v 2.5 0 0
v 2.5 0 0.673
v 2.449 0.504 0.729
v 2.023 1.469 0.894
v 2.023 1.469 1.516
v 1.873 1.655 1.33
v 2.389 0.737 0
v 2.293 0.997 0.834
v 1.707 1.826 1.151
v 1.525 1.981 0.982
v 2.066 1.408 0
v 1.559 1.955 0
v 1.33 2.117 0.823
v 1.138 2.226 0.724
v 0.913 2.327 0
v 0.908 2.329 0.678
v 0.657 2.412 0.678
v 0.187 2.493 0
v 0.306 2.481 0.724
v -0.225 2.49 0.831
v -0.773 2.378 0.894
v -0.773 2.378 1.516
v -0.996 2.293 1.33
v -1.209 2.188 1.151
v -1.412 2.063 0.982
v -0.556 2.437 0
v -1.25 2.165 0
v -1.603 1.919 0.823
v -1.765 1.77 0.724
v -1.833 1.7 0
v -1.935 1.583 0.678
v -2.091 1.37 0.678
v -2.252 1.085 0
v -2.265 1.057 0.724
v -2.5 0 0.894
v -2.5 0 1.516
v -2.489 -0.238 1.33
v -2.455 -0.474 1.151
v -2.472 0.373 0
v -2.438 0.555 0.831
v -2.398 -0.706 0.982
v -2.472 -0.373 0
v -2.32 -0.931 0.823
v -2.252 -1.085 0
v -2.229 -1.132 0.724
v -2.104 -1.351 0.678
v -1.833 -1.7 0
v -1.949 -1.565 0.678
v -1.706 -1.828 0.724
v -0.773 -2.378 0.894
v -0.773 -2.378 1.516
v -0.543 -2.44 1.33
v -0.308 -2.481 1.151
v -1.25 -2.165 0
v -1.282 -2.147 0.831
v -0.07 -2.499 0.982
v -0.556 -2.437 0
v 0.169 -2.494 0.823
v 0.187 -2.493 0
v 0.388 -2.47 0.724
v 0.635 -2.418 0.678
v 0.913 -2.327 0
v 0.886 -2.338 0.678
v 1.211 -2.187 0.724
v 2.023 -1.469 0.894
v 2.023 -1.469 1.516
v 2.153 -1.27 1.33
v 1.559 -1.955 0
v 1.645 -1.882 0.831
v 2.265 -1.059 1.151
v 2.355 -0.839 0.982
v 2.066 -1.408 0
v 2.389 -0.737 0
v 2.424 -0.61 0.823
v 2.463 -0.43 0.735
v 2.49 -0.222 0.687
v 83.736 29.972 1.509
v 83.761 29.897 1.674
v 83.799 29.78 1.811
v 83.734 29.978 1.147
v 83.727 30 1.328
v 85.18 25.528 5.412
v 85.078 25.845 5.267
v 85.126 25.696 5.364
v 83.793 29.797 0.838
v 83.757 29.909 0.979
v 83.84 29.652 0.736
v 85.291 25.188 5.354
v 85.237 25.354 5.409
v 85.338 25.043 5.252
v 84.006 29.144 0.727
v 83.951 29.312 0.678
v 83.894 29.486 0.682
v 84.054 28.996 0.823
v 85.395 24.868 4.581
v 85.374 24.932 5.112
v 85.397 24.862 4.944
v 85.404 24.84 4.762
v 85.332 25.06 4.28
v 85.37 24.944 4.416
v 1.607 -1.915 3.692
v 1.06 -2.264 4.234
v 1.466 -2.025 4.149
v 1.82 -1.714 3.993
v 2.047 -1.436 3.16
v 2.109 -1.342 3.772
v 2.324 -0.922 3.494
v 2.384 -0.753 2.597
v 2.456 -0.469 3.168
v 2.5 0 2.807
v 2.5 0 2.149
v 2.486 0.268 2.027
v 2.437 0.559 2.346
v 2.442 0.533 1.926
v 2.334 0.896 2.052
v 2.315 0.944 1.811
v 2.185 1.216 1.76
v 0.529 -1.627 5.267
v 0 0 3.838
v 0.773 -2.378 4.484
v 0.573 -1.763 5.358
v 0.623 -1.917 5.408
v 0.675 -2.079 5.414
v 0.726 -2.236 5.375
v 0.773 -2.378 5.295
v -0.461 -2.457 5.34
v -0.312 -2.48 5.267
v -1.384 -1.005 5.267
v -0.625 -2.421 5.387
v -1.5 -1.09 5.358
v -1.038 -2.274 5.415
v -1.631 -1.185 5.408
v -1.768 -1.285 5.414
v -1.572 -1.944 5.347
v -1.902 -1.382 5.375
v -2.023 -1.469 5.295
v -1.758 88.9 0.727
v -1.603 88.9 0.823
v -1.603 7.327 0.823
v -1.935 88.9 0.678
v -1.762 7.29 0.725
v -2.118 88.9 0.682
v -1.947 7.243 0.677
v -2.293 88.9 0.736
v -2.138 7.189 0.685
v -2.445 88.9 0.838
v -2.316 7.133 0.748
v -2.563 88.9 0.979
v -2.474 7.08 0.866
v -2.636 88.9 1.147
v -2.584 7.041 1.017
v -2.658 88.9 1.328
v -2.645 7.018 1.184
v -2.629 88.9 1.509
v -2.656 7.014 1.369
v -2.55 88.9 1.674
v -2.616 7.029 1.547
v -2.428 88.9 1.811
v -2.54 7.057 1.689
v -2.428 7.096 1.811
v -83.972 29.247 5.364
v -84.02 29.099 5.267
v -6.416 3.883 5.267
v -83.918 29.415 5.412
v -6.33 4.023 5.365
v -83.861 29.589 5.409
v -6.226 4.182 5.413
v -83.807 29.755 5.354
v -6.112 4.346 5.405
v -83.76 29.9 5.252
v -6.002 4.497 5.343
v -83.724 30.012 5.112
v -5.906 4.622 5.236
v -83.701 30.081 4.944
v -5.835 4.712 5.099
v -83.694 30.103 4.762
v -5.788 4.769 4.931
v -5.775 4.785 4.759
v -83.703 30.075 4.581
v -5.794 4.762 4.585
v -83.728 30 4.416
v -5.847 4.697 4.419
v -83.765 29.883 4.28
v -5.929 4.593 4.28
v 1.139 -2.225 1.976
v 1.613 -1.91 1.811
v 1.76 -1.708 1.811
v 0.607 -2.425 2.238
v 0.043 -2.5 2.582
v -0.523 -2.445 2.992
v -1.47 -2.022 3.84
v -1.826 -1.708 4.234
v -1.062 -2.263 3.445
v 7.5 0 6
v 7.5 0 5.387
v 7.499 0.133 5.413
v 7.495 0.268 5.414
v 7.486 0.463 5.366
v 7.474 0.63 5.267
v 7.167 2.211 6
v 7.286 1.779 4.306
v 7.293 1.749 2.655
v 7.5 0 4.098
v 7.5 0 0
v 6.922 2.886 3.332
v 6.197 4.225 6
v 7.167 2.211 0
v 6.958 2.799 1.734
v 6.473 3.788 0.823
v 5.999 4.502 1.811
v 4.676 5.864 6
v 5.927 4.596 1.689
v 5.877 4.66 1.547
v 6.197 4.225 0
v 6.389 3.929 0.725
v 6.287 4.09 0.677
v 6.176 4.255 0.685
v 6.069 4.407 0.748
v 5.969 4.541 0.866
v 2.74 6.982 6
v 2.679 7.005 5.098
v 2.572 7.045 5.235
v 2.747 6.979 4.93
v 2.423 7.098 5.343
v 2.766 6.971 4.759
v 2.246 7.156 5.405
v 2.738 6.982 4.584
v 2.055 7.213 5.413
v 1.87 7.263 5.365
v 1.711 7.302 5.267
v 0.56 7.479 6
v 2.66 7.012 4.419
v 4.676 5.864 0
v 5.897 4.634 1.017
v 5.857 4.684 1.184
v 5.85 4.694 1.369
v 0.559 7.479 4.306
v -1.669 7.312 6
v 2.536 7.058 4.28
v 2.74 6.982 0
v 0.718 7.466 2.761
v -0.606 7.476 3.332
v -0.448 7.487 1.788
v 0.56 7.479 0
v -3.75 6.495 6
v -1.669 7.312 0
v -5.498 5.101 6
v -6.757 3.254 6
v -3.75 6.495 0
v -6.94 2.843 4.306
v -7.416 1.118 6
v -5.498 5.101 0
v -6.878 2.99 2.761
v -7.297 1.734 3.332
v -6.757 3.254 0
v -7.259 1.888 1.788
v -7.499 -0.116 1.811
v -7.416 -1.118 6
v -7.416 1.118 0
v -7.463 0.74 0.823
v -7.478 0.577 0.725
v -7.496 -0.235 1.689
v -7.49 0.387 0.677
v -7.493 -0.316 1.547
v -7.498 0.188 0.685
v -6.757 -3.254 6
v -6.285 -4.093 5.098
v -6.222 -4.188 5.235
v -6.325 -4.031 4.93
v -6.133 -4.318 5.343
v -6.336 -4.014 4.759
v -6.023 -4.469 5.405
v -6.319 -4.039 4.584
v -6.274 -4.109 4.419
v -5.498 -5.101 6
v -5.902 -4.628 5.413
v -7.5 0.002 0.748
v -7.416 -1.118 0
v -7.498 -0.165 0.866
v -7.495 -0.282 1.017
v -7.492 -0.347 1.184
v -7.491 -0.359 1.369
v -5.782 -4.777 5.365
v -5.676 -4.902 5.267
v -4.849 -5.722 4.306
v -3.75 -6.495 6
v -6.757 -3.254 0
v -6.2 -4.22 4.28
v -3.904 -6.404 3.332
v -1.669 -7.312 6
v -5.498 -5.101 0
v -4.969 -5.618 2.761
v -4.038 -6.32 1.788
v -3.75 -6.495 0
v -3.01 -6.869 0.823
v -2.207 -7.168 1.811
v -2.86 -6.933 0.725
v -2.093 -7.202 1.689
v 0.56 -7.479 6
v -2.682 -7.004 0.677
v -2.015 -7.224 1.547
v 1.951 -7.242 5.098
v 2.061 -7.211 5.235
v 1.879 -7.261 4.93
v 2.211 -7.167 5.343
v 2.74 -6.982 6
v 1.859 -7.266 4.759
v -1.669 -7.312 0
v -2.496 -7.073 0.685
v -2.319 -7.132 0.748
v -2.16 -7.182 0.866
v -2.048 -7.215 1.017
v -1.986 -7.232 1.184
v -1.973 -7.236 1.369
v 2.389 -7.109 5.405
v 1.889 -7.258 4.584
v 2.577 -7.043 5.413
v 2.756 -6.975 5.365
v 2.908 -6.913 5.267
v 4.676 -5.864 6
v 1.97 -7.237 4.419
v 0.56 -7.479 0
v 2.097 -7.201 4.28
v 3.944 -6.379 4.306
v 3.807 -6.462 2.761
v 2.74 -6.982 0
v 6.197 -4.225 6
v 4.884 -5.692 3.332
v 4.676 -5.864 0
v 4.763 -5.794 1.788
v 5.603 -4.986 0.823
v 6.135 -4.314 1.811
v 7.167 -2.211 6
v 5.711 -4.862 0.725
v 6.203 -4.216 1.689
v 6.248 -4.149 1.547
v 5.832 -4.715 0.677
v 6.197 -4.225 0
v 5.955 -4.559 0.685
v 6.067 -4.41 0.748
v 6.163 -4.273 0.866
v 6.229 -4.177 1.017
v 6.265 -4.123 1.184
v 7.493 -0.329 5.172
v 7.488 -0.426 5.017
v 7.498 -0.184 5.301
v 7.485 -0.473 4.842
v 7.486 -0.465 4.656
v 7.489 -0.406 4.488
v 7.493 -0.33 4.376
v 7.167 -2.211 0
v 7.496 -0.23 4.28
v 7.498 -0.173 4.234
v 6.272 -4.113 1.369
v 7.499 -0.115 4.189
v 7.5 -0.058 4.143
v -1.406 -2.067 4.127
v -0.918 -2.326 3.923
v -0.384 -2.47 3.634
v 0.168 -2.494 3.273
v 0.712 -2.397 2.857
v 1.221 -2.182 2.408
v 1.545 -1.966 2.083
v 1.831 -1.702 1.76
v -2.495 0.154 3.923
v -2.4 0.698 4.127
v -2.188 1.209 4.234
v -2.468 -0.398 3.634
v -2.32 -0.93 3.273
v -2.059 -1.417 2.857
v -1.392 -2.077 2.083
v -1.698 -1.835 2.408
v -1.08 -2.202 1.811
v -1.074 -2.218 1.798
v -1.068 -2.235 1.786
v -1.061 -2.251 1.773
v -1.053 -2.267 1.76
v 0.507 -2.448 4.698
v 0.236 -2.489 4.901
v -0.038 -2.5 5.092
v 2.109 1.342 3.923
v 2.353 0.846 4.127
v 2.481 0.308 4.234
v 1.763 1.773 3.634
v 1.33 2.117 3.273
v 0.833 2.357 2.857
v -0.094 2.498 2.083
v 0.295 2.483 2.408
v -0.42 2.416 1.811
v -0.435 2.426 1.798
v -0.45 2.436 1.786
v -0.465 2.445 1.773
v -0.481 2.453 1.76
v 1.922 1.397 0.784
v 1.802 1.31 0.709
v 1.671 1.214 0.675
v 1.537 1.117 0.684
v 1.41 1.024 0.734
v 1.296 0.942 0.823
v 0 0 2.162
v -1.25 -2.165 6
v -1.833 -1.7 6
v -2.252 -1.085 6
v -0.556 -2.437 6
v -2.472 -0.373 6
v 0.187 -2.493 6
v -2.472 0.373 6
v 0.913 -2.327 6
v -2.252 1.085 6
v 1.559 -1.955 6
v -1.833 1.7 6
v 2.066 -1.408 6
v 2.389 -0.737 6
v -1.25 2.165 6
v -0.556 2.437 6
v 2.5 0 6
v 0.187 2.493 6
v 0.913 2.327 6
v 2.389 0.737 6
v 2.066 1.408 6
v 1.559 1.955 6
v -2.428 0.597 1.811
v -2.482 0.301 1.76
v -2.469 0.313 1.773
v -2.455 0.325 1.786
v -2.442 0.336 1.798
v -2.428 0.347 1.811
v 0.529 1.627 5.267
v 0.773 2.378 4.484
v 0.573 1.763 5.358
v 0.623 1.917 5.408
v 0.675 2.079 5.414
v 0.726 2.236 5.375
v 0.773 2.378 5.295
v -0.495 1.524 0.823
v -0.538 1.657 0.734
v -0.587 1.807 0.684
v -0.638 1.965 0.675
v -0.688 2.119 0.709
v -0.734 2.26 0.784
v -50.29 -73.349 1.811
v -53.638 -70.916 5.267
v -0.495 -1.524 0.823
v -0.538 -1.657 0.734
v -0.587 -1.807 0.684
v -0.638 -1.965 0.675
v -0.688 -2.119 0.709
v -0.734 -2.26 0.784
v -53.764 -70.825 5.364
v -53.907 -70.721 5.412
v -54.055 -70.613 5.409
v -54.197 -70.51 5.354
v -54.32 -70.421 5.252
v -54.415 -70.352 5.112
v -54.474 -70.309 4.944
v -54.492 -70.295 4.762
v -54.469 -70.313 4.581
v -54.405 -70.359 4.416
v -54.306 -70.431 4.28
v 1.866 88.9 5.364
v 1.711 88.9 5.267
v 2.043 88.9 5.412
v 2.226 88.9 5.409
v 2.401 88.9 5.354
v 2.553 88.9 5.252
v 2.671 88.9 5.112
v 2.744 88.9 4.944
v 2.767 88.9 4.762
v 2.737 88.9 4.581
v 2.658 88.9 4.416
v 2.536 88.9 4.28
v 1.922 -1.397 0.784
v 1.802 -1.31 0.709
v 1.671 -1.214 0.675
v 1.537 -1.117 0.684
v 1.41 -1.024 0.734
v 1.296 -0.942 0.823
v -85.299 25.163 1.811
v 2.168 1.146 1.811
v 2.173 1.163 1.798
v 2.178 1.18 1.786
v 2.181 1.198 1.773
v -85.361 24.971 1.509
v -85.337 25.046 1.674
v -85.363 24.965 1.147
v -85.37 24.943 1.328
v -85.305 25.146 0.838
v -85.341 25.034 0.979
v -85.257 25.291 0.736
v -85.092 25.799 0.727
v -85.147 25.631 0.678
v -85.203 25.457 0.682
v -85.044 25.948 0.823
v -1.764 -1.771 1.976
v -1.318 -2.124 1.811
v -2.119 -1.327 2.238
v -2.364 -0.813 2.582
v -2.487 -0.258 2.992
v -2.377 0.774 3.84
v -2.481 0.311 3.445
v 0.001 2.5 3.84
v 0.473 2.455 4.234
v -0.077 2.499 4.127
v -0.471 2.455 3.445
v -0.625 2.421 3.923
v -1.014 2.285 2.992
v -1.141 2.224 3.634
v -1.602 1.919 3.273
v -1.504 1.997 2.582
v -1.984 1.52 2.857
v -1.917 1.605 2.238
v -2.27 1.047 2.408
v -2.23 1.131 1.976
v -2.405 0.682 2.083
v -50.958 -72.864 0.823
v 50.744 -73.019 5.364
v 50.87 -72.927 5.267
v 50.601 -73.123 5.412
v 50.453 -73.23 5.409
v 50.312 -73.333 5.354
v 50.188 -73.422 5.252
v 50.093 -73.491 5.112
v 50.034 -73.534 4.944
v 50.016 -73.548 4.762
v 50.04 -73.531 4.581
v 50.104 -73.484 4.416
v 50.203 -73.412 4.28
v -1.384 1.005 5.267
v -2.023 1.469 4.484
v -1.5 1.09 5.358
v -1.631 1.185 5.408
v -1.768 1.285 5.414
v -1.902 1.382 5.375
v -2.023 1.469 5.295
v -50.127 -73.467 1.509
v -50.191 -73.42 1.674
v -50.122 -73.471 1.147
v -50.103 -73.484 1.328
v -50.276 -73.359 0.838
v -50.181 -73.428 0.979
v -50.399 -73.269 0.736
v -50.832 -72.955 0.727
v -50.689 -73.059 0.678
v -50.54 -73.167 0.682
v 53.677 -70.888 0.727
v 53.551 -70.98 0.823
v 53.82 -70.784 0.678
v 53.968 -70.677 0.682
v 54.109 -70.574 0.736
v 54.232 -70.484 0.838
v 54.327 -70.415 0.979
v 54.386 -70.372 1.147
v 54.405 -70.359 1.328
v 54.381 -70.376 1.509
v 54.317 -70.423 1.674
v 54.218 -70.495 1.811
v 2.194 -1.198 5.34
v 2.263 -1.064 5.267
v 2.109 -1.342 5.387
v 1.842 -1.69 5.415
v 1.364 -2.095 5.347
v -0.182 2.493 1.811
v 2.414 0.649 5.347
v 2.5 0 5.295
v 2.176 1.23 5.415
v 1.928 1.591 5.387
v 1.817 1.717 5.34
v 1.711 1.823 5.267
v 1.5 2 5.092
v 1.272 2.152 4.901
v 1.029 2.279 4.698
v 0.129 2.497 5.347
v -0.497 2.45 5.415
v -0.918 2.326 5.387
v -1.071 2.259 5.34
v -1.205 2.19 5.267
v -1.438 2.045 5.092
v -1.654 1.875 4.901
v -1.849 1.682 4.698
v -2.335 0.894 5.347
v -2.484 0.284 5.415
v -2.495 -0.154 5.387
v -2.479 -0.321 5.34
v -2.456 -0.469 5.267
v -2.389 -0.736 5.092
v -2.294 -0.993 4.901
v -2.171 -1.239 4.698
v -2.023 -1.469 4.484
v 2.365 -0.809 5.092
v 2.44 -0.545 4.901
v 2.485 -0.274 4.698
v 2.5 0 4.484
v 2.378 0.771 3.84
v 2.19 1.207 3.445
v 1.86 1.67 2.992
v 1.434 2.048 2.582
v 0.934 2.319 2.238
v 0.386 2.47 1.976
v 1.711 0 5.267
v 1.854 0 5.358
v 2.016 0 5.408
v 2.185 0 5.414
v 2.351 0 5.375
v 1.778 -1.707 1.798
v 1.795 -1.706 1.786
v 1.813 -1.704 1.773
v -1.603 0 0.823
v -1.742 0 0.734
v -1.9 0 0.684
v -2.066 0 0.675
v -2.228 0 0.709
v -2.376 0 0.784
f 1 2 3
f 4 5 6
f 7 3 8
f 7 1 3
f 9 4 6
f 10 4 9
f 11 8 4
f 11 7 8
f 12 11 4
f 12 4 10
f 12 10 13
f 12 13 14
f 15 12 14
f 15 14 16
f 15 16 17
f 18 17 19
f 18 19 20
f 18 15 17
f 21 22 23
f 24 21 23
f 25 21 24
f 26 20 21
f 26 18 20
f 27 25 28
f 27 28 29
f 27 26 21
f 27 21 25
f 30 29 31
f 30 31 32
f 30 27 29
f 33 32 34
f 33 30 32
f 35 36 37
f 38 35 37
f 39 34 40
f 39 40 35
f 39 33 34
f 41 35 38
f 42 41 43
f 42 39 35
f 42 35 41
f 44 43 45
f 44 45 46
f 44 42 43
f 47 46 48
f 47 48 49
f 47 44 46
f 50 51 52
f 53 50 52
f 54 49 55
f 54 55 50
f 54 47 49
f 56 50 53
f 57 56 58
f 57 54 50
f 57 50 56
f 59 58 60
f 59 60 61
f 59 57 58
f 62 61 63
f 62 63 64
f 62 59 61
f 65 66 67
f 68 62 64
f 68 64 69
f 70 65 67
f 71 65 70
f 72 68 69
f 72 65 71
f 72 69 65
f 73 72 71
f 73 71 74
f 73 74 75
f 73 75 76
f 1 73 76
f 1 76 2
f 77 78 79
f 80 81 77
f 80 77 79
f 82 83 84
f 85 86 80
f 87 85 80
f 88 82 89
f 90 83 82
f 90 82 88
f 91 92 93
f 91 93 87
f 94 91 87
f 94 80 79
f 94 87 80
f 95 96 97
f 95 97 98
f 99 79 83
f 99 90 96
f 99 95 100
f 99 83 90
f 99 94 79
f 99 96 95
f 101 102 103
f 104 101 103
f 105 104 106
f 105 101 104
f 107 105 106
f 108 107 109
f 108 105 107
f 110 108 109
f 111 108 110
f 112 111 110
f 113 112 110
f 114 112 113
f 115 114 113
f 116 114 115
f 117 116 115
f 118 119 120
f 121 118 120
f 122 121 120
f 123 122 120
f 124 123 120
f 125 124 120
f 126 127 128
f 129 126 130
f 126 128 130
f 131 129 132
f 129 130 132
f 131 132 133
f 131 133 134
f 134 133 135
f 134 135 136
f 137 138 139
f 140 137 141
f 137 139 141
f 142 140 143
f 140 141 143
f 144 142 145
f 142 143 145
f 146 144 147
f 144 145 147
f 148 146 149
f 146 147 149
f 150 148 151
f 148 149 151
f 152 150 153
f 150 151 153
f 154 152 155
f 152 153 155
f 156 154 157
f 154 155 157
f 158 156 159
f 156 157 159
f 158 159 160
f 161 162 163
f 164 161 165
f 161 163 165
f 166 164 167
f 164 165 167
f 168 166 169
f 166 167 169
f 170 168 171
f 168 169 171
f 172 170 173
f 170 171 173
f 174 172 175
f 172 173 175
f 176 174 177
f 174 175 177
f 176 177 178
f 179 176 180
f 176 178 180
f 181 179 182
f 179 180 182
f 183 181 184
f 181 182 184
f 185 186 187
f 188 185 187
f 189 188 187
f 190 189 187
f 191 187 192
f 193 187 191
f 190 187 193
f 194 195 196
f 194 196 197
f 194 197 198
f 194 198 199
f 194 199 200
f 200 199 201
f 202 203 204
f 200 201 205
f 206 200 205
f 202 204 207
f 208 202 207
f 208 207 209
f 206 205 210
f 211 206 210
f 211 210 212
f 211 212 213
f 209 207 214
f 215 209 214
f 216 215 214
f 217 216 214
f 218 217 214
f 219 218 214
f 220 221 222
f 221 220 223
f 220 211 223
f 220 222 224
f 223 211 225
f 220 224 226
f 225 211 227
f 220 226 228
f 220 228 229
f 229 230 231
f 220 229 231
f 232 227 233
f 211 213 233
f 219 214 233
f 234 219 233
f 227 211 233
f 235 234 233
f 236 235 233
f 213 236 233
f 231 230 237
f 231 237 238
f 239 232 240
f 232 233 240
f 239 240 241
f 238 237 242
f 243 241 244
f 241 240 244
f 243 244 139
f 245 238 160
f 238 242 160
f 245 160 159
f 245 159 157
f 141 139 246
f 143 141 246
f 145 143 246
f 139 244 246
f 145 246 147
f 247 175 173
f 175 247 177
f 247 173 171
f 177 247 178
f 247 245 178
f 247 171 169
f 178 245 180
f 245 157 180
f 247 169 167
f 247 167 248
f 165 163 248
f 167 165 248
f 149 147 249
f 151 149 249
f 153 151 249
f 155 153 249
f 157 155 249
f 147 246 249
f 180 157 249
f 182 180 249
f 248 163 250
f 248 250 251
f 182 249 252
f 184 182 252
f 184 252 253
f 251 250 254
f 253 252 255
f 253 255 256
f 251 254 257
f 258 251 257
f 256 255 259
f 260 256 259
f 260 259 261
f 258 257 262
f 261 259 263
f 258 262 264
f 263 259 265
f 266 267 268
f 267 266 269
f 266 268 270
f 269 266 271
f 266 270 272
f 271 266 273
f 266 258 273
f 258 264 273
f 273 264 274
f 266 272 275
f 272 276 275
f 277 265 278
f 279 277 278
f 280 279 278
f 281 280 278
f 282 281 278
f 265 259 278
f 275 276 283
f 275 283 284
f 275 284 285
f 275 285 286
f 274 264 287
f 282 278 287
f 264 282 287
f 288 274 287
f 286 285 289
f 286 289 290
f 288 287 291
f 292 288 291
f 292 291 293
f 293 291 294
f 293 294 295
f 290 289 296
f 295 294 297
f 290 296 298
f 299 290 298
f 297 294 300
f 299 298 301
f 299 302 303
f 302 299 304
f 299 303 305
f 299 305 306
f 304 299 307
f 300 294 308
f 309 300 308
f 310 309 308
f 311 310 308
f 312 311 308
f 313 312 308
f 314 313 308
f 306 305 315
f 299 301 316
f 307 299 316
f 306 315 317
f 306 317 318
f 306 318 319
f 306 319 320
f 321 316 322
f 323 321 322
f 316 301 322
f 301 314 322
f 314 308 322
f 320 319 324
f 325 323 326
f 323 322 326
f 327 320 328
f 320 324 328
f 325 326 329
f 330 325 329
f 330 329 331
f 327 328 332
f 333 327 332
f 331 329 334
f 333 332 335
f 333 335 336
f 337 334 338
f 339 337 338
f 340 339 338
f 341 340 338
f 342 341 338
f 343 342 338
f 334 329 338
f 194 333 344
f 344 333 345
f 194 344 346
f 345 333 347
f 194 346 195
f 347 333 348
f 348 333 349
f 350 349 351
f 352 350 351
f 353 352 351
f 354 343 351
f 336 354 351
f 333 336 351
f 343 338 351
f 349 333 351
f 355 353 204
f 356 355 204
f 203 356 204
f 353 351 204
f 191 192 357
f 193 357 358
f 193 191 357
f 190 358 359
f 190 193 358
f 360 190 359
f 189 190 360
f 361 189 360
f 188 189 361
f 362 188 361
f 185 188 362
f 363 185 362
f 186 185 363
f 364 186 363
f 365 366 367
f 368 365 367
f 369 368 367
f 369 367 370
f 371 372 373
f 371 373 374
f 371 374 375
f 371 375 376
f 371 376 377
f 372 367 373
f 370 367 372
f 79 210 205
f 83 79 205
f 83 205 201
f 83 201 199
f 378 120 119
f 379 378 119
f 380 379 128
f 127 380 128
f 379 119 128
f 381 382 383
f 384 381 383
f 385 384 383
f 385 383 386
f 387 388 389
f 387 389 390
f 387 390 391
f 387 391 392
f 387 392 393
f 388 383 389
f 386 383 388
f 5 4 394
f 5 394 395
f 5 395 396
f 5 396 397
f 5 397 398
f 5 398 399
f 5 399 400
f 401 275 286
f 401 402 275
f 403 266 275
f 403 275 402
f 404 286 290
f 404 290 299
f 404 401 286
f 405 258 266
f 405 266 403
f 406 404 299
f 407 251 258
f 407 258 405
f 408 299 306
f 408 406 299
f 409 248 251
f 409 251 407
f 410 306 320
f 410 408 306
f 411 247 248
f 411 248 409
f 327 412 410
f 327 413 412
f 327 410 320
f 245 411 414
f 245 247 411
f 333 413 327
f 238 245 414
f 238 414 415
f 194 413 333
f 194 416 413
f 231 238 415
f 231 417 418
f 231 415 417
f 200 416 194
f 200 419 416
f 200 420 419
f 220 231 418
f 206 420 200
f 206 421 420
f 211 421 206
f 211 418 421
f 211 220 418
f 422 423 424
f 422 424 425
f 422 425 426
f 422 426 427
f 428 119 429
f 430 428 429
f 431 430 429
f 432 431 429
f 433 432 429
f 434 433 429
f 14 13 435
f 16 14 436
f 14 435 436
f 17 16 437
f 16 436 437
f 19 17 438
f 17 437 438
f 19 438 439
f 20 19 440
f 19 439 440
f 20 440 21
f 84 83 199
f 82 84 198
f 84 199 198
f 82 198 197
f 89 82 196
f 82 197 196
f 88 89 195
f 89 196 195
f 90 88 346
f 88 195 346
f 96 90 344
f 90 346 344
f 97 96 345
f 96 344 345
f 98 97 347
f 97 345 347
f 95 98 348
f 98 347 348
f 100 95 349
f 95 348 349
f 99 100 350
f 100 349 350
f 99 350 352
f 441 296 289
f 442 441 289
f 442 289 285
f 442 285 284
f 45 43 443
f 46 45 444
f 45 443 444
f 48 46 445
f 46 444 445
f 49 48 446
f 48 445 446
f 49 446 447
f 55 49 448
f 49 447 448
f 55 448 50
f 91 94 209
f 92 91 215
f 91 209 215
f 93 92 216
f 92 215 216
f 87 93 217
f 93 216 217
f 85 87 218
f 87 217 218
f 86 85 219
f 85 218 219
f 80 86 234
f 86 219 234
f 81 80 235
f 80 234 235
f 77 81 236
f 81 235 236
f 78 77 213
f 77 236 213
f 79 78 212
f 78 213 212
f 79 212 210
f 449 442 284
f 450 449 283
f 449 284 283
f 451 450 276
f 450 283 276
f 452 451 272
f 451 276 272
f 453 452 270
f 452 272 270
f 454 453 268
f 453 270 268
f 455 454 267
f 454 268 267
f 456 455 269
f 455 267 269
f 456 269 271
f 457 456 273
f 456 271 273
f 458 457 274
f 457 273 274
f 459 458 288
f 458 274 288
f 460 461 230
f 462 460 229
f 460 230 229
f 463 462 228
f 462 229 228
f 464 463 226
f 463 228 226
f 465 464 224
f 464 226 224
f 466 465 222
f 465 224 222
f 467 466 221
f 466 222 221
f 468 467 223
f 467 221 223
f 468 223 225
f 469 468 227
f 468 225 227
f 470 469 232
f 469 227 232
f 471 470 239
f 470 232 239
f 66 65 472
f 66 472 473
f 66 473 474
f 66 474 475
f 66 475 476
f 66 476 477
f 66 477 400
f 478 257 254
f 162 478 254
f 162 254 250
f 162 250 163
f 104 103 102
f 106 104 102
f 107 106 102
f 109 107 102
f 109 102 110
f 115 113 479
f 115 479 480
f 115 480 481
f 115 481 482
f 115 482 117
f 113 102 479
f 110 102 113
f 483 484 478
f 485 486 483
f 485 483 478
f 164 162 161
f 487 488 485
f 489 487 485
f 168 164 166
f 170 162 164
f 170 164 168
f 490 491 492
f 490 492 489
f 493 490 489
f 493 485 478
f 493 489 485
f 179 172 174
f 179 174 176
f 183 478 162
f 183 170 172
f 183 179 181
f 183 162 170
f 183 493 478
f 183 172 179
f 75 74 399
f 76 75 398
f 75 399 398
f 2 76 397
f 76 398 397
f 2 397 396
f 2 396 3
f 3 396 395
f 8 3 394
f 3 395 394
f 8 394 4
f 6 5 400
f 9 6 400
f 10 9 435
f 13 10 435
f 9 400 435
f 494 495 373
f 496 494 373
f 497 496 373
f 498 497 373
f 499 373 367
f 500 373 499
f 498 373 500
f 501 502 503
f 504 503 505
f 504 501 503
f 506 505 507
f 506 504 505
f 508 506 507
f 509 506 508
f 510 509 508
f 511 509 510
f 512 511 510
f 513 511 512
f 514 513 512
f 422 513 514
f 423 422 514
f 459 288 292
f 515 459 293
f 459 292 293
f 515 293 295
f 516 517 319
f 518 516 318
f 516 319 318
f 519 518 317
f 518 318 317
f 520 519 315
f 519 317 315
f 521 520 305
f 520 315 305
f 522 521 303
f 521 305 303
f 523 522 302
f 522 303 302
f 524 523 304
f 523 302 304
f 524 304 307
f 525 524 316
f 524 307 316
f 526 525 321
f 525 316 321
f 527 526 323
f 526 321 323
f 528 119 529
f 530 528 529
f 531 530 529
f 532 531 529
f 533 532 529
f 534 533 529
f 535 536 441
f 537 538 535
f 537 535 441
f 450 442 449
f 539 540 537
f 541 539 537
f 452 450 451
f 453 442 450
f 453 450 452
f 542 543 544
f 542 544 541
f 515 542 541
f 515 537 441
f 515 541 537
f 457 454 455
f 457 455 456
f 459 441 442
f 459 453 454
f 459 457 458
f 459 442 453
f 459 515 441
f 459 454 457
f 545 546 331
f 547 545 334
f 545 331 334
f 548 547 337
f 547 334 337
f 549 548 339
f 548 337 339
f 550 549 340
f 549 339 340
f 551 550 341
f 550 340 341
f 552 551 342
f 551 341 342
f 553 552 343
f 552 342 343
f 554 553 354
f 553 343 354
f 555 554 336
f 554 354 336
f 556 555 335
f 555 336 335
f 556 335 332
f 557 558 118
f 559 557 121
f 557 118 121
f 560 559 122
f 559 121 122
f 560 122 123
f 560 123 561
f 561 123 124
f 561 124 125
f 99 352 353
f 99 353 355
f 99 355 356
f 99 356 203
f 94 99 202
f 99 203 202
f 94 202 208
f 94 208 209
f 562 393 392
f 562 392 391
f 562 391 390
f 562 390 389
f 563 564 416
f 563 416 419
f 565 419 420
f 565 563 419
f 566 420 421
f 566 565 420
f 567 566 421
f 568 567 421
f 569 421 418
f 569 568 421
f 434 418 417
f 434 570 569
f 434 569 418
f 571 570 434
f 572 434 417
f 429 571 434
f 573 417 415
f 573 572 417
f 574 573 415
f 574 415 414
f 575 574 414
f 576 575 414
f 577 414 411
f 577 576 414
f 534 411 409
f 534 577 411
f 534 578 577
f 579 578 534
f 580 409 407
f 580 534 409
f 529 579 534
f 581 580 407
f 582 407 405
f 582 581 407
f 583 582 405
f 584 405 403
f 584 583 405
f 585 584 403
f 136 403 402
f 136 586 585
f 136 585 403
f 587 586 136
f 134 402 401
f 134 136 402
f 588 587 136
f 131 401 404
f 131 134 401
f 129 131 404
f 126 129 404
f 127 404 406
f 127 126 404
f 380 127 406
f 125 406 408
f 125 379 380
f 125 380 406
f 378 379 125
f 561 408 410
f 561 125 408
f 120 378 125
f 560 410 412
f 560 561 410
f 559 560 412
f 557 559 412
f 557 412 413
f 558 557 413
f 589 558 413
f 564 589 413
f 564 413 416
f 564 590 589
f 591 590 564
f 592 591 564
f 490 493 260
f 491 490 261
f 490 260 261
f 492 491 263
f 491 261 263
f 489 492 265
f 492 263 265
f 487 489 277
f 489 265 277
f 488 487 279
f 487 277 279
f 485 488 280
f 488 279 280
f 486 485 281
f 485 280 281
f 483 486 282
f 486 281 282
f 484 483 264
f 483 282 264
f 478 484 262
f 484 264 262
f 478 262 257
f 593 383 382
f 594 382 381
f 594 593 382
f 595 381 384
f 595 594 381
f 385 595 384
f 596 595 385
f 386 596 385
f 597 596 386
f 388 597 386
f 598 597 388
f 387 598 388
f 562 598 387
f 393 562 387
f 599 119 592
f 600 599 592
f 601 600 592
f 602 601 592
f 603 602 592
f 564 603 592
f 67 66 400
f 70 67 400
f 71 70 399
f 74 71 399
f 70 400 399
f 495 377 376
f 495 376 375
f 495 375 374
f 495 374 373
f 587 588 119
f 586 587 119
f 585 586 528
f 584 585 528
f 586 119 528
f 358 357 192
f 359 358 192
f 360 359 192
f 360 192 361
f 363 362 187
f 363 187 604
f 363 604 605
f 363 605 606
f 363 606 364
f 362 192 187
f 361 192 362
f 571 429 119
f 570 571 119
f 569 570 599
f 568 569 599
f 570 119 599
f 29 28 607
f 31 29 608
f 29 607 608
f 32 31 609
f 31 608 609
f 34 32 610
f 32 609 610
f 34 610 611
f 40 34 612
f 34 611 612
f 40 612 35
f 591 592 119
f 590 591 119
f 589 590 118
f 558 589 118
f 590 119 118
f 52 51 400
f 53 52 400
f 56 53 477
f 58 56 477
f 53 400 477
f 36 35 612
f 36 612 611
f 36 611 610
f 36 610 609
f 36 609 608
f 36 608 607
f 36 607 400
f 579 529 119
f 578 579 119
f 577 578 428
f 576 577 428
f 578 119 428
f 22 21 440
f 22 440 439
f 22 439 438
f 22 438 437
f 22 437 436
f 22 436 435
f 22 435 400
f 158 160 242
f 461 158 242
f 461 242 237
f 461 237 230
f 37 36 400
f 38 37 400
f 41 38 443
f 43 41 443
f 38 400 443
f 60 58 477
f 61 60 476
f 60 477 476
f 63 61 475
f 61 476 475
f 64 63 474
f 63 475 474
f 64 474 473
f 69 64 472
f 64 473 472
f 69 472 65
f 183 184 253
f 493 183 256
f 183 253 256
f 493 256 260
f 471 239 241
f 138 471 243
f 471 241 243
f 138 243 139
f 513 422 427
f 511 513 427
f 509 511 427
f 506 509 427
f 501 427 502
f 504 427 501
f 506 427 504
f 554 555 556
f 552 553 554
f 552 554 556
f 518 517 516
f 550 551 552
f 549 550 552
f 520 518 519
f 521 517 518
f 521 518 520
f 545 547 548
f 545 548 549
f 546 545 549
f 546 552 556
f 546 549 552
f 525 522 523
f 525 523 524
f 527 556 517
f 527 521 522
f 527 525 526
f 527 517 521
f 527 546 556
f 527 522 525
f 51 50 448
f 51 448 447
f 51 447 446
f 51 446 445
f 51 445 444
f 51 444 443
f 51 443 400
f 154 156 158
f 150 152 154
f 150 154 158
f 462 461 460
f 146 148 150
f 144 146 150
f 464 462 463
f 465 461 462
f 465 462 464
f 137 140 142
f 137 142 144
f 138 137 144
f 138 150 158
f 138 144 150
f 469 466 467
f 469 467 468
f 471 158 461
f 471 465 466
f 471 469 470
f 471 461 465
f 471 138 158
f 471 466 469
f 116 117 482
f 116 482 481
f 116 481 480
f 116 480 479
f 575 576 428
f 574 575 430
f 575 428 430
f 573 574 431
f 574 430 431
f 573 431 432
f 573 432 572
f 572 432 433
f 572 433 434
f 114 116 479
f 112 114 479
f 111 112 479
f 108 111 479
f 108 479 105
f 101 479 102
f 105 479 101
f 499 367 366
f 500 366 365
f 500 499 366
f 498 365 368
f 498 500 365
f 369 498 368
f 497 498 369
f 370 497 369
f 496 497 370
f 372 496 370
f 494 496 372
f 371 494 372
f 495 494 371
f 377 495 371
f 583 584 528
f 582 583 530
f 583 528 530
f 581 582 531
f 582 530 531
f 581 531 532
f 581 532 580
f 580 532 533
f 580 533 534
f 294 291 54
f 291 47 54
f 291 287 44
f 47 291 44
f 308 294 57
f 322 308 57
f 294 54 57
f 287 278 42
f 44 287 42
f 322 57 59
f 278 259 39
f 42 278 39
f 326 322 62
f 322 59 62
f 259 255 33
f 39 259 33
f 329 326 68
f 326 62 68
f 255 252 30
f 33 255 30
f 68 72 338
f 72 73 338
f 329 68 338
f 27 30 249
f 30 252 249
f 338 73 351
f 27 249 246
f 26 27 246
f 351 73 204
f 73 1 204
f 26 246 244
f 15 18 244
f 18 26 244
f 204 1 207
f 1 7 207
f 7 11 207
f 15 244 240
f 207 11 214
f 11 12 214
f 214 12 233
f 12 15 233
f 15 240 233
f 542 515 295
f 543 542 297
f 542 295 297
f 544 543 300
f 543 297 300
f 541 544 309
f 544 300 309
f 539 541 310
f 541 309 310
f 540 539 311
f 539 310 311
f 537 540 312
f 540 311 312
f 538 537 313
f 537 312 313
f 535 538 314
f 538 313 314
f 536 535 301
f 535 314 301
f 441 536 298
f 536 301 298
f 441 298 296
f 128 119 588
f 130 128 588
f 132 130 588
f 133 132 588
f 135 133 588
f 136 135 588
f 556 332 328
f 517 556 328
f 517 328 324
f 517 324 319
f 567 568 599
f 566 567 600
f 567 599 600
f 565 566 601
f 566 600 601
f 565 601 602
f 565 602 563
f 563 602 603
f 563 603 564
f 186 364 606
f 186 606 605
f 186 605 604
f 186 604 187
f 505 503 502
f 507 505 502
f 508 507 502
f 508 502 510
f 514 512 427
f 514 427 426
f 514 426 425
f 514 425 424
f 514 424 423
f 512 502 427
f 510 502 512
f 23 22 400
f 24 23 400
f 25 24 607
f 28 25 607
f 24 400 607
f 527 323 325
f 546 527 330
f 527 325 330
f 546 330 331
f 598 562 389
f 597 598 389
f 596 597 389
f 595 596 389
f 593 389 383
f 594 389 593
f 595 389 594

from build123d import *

# Parameters (mm, degrees)
SKETCH1_R           = 7.5
SKETCH1_R_2         = 2.5
BOSS_EXTRUDE1_DEPTH = 6
BOSS_EXTRUDE2_DEPTH = 88.9
CIRPATTERN1_COUNT   = 5


with BuildPart() as part:
    # Sketch1 → Boss-Extrude1 (new body)
    with BuildSketch(Plane.XY):
        Circle(SKETCH1_R)
        Circle(SKETCH1_R_2, mode=Mode.SUBTRACT)
    extrude(amount=BOSS_EXTRUDE1_DEPTH)

    # Sketch3 → Boss-Extrude2 (add)
    with BuildSketch(Plane(origin=(0, 0, 0), x_dir=(1, 0, 0), z_dir=(0, 1, 0))):
        with BuildLine():
            Line((-2.427610564, -1.81062126), (1.710616437, -5.267397014))
            ThreePointArc((1.710616437, -5.267397014), (2.617021972, -5.186071015), (2.535695974, -4.27966548))
            Line((2.535695974, -4.27966548), (-1.602531027, -0.822889726))
            ThreePointArc((-1.602531027, -0.822889726), (-2.508936562, -0.904215725), (-2.427610564, -1.81062126))
        make_face()
    boss_extrude2 = extrude(amount=BOSS_EXTRUDE2_DEPTH)

    # CirPattern1: Boss-Extrude2 ×5 about axis
    cirpattern1_axis = Axis((0, 0, 0), (0, 0, 1))
    for i in range(1, CIRPATTERN1_COUNT):
        add(boss_extrude2.rotate(cirpattern1_axis, i * 360 / CIRPATTERN1_COUNT))


solid = part.part
